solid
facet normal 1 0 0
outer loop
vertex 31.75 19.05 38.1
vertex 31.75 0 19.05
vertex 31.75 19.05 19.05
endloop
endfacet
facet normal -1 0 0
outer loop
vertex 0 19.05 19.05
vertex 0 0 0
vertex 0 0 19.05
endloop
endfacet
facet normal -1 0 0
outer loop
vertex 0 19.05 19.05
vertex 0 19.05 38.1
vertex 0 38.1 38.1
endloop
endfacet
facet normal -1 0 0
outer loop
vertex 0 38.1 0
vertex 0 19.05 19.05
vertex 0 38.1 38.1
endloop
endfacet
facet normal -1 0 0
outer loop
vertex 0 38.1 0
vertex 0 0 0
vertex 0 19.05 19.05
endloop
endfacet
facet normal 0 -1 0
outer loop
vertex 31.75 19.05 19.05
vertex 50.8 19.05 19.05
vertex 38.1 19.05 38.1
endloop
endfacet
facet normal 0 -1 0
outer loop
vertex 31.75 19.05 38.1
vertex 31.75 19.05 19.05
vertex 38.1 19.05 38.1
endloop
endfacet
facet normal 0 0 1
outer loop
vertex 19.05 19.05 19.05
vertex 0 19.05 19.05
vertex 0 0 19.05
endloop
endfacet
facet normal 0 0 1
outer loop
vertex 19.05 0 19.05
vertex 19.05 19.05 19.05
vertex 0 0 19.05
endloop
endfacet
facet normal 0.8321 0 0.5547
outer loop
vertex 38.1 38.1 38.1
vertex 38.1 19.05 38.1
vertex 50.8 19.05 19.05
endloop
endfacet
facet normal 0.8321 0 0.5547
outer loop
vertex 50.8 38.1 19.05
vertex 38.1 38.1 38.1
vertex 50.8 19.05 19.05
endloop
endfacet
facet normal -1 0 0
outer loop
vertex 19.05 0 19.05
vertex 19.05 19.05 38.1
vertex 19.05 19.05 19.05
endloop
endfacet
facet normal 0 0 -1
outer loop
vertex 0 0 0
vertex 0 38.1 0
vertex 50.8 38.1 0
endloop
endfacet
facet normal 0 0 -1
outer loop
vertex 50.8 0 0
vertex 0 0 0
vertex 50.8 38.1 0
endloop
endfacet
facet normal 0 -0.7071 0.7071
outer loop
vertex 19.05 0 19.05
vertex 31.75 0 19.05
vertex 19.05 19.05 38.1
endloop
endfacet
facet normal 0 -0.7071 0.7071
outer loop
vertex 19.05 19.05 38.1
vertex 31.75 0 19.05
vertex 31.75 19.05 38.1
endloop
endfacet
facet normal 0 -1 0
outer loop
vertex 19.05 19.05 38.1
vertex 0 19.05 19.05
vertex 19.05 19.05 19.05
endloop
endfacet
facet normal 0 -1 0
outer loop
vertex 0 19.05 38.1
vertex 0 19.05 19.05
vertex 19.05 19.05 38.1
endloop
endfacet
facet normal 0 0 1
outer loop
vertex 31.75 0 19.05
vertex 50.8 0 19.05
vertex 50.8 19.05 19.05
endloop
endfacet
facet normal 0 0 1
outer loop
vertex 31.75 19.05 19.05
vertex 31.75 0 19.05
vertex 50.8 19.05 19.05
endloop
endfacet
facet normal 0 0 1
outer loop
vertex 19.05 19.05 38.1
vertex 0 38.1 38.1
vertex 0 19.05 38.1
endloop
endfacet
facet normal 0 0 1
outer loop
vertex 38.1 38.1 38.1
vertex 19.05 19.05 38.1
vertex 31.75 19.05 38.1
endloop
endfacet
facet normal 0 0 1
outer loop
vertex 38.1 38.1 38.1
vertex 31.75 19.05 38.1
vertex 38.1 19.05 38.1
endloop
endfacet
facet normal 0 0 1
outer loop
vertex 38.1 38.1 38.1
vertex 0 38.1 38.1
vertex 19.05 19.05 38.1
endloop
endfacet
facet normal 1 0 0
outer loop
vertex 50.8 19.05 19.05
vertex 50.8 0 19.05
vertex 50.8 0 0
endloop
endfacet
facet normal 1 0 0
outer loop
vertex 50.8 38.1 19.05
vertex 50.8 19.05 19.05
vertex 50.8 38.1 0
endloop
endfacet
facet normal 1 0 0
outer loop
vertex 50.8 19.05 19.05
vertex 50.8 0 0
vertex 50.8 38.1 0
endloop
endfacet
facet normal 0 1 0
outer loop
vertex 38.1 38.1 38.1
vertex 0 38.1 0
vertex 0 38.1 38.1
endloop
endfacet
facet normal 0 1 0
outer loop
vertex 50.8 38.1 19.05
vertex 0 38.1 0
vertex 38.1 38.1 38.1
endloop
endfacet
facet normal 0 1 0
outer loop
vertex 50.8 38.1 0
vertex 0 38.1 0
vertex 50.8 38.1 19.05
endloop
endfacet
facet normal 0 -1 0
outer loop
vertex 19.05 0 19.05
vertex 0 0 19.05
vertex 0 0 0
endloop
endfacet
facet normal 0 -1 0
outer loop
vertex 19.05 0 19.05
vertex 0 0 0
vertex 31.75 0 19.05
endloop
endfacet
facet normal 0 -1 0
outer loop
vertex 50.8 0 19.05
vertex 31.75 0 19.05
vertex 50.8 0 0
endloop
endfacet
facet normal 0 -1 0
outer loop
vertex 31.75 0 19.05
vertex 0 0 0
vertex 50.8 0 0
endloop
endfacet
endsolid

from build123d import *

# Parameters (mm, degrees)
F0_W     = 50.8
F0_H     = 38.1
F1_DEPTH = 38.1
F2_W     = 19.05
F2_H     = 19.05
F3_DEPTH = 19.05
F4_W     = 19.05
F4_H     = 19.05
F5_DEPTH = 19.05
F7_DEPTH = 31.751
F9_DEPTH = 19.051


with BuildPart() as f1:
    # F0 (on Top) → F1 (new body)
    with BuildSketch(Plane.XY):
        with Locations((25.4, 19.05)):
            Rectangle(F0_W, F0_H)
    extrude(amount=F1_DEPTH)

    # F2 (on face) → F3 (cut)
    with BuildSketch(Plane(origin=(0, 0, 0), x_dir=(0, -1, 0), z_dir=(-1, 0, 0))):
        with Locations((-9.525, 28.575)):
            Rectangle(F2_W, F2_H)
    extrude(amount=-F3_DEPTH, mode=Mode.SUBTRACT)

    # F4 (on face) → F5 (cut)
    with BuildSketch(Plane.YZ.offset(50.8)):
        with Locations((9.525, 28.575)):
            Rectangle(F4_W, F4_H)
    extrude(amount=-F5_DEPTH, mode=Mode.SUBTRACT)

    # F6 (on face) → F7 (cut, through all)
    with BuildSketch(Plane.YZ.offset(31.75)):
        Polygon((0, 38.1), (0, 19.05), (19.05, 38.1), align=None)
    extrude(amount=-F7_DEPTH, mode=Mode.SUBTRACT)

    # F8 (on face) → F9 (cut, through all)
    with BuildSketch(Plane.XZ.offset(-19.05)):
        Polygon((50.8, 38.1), (38.1, 38.1), (50.8, 19.05), align=None)
    extrude(amount=-F9_DEPTH, mode=Mode.SUBTRACT)


solid = f1.part
